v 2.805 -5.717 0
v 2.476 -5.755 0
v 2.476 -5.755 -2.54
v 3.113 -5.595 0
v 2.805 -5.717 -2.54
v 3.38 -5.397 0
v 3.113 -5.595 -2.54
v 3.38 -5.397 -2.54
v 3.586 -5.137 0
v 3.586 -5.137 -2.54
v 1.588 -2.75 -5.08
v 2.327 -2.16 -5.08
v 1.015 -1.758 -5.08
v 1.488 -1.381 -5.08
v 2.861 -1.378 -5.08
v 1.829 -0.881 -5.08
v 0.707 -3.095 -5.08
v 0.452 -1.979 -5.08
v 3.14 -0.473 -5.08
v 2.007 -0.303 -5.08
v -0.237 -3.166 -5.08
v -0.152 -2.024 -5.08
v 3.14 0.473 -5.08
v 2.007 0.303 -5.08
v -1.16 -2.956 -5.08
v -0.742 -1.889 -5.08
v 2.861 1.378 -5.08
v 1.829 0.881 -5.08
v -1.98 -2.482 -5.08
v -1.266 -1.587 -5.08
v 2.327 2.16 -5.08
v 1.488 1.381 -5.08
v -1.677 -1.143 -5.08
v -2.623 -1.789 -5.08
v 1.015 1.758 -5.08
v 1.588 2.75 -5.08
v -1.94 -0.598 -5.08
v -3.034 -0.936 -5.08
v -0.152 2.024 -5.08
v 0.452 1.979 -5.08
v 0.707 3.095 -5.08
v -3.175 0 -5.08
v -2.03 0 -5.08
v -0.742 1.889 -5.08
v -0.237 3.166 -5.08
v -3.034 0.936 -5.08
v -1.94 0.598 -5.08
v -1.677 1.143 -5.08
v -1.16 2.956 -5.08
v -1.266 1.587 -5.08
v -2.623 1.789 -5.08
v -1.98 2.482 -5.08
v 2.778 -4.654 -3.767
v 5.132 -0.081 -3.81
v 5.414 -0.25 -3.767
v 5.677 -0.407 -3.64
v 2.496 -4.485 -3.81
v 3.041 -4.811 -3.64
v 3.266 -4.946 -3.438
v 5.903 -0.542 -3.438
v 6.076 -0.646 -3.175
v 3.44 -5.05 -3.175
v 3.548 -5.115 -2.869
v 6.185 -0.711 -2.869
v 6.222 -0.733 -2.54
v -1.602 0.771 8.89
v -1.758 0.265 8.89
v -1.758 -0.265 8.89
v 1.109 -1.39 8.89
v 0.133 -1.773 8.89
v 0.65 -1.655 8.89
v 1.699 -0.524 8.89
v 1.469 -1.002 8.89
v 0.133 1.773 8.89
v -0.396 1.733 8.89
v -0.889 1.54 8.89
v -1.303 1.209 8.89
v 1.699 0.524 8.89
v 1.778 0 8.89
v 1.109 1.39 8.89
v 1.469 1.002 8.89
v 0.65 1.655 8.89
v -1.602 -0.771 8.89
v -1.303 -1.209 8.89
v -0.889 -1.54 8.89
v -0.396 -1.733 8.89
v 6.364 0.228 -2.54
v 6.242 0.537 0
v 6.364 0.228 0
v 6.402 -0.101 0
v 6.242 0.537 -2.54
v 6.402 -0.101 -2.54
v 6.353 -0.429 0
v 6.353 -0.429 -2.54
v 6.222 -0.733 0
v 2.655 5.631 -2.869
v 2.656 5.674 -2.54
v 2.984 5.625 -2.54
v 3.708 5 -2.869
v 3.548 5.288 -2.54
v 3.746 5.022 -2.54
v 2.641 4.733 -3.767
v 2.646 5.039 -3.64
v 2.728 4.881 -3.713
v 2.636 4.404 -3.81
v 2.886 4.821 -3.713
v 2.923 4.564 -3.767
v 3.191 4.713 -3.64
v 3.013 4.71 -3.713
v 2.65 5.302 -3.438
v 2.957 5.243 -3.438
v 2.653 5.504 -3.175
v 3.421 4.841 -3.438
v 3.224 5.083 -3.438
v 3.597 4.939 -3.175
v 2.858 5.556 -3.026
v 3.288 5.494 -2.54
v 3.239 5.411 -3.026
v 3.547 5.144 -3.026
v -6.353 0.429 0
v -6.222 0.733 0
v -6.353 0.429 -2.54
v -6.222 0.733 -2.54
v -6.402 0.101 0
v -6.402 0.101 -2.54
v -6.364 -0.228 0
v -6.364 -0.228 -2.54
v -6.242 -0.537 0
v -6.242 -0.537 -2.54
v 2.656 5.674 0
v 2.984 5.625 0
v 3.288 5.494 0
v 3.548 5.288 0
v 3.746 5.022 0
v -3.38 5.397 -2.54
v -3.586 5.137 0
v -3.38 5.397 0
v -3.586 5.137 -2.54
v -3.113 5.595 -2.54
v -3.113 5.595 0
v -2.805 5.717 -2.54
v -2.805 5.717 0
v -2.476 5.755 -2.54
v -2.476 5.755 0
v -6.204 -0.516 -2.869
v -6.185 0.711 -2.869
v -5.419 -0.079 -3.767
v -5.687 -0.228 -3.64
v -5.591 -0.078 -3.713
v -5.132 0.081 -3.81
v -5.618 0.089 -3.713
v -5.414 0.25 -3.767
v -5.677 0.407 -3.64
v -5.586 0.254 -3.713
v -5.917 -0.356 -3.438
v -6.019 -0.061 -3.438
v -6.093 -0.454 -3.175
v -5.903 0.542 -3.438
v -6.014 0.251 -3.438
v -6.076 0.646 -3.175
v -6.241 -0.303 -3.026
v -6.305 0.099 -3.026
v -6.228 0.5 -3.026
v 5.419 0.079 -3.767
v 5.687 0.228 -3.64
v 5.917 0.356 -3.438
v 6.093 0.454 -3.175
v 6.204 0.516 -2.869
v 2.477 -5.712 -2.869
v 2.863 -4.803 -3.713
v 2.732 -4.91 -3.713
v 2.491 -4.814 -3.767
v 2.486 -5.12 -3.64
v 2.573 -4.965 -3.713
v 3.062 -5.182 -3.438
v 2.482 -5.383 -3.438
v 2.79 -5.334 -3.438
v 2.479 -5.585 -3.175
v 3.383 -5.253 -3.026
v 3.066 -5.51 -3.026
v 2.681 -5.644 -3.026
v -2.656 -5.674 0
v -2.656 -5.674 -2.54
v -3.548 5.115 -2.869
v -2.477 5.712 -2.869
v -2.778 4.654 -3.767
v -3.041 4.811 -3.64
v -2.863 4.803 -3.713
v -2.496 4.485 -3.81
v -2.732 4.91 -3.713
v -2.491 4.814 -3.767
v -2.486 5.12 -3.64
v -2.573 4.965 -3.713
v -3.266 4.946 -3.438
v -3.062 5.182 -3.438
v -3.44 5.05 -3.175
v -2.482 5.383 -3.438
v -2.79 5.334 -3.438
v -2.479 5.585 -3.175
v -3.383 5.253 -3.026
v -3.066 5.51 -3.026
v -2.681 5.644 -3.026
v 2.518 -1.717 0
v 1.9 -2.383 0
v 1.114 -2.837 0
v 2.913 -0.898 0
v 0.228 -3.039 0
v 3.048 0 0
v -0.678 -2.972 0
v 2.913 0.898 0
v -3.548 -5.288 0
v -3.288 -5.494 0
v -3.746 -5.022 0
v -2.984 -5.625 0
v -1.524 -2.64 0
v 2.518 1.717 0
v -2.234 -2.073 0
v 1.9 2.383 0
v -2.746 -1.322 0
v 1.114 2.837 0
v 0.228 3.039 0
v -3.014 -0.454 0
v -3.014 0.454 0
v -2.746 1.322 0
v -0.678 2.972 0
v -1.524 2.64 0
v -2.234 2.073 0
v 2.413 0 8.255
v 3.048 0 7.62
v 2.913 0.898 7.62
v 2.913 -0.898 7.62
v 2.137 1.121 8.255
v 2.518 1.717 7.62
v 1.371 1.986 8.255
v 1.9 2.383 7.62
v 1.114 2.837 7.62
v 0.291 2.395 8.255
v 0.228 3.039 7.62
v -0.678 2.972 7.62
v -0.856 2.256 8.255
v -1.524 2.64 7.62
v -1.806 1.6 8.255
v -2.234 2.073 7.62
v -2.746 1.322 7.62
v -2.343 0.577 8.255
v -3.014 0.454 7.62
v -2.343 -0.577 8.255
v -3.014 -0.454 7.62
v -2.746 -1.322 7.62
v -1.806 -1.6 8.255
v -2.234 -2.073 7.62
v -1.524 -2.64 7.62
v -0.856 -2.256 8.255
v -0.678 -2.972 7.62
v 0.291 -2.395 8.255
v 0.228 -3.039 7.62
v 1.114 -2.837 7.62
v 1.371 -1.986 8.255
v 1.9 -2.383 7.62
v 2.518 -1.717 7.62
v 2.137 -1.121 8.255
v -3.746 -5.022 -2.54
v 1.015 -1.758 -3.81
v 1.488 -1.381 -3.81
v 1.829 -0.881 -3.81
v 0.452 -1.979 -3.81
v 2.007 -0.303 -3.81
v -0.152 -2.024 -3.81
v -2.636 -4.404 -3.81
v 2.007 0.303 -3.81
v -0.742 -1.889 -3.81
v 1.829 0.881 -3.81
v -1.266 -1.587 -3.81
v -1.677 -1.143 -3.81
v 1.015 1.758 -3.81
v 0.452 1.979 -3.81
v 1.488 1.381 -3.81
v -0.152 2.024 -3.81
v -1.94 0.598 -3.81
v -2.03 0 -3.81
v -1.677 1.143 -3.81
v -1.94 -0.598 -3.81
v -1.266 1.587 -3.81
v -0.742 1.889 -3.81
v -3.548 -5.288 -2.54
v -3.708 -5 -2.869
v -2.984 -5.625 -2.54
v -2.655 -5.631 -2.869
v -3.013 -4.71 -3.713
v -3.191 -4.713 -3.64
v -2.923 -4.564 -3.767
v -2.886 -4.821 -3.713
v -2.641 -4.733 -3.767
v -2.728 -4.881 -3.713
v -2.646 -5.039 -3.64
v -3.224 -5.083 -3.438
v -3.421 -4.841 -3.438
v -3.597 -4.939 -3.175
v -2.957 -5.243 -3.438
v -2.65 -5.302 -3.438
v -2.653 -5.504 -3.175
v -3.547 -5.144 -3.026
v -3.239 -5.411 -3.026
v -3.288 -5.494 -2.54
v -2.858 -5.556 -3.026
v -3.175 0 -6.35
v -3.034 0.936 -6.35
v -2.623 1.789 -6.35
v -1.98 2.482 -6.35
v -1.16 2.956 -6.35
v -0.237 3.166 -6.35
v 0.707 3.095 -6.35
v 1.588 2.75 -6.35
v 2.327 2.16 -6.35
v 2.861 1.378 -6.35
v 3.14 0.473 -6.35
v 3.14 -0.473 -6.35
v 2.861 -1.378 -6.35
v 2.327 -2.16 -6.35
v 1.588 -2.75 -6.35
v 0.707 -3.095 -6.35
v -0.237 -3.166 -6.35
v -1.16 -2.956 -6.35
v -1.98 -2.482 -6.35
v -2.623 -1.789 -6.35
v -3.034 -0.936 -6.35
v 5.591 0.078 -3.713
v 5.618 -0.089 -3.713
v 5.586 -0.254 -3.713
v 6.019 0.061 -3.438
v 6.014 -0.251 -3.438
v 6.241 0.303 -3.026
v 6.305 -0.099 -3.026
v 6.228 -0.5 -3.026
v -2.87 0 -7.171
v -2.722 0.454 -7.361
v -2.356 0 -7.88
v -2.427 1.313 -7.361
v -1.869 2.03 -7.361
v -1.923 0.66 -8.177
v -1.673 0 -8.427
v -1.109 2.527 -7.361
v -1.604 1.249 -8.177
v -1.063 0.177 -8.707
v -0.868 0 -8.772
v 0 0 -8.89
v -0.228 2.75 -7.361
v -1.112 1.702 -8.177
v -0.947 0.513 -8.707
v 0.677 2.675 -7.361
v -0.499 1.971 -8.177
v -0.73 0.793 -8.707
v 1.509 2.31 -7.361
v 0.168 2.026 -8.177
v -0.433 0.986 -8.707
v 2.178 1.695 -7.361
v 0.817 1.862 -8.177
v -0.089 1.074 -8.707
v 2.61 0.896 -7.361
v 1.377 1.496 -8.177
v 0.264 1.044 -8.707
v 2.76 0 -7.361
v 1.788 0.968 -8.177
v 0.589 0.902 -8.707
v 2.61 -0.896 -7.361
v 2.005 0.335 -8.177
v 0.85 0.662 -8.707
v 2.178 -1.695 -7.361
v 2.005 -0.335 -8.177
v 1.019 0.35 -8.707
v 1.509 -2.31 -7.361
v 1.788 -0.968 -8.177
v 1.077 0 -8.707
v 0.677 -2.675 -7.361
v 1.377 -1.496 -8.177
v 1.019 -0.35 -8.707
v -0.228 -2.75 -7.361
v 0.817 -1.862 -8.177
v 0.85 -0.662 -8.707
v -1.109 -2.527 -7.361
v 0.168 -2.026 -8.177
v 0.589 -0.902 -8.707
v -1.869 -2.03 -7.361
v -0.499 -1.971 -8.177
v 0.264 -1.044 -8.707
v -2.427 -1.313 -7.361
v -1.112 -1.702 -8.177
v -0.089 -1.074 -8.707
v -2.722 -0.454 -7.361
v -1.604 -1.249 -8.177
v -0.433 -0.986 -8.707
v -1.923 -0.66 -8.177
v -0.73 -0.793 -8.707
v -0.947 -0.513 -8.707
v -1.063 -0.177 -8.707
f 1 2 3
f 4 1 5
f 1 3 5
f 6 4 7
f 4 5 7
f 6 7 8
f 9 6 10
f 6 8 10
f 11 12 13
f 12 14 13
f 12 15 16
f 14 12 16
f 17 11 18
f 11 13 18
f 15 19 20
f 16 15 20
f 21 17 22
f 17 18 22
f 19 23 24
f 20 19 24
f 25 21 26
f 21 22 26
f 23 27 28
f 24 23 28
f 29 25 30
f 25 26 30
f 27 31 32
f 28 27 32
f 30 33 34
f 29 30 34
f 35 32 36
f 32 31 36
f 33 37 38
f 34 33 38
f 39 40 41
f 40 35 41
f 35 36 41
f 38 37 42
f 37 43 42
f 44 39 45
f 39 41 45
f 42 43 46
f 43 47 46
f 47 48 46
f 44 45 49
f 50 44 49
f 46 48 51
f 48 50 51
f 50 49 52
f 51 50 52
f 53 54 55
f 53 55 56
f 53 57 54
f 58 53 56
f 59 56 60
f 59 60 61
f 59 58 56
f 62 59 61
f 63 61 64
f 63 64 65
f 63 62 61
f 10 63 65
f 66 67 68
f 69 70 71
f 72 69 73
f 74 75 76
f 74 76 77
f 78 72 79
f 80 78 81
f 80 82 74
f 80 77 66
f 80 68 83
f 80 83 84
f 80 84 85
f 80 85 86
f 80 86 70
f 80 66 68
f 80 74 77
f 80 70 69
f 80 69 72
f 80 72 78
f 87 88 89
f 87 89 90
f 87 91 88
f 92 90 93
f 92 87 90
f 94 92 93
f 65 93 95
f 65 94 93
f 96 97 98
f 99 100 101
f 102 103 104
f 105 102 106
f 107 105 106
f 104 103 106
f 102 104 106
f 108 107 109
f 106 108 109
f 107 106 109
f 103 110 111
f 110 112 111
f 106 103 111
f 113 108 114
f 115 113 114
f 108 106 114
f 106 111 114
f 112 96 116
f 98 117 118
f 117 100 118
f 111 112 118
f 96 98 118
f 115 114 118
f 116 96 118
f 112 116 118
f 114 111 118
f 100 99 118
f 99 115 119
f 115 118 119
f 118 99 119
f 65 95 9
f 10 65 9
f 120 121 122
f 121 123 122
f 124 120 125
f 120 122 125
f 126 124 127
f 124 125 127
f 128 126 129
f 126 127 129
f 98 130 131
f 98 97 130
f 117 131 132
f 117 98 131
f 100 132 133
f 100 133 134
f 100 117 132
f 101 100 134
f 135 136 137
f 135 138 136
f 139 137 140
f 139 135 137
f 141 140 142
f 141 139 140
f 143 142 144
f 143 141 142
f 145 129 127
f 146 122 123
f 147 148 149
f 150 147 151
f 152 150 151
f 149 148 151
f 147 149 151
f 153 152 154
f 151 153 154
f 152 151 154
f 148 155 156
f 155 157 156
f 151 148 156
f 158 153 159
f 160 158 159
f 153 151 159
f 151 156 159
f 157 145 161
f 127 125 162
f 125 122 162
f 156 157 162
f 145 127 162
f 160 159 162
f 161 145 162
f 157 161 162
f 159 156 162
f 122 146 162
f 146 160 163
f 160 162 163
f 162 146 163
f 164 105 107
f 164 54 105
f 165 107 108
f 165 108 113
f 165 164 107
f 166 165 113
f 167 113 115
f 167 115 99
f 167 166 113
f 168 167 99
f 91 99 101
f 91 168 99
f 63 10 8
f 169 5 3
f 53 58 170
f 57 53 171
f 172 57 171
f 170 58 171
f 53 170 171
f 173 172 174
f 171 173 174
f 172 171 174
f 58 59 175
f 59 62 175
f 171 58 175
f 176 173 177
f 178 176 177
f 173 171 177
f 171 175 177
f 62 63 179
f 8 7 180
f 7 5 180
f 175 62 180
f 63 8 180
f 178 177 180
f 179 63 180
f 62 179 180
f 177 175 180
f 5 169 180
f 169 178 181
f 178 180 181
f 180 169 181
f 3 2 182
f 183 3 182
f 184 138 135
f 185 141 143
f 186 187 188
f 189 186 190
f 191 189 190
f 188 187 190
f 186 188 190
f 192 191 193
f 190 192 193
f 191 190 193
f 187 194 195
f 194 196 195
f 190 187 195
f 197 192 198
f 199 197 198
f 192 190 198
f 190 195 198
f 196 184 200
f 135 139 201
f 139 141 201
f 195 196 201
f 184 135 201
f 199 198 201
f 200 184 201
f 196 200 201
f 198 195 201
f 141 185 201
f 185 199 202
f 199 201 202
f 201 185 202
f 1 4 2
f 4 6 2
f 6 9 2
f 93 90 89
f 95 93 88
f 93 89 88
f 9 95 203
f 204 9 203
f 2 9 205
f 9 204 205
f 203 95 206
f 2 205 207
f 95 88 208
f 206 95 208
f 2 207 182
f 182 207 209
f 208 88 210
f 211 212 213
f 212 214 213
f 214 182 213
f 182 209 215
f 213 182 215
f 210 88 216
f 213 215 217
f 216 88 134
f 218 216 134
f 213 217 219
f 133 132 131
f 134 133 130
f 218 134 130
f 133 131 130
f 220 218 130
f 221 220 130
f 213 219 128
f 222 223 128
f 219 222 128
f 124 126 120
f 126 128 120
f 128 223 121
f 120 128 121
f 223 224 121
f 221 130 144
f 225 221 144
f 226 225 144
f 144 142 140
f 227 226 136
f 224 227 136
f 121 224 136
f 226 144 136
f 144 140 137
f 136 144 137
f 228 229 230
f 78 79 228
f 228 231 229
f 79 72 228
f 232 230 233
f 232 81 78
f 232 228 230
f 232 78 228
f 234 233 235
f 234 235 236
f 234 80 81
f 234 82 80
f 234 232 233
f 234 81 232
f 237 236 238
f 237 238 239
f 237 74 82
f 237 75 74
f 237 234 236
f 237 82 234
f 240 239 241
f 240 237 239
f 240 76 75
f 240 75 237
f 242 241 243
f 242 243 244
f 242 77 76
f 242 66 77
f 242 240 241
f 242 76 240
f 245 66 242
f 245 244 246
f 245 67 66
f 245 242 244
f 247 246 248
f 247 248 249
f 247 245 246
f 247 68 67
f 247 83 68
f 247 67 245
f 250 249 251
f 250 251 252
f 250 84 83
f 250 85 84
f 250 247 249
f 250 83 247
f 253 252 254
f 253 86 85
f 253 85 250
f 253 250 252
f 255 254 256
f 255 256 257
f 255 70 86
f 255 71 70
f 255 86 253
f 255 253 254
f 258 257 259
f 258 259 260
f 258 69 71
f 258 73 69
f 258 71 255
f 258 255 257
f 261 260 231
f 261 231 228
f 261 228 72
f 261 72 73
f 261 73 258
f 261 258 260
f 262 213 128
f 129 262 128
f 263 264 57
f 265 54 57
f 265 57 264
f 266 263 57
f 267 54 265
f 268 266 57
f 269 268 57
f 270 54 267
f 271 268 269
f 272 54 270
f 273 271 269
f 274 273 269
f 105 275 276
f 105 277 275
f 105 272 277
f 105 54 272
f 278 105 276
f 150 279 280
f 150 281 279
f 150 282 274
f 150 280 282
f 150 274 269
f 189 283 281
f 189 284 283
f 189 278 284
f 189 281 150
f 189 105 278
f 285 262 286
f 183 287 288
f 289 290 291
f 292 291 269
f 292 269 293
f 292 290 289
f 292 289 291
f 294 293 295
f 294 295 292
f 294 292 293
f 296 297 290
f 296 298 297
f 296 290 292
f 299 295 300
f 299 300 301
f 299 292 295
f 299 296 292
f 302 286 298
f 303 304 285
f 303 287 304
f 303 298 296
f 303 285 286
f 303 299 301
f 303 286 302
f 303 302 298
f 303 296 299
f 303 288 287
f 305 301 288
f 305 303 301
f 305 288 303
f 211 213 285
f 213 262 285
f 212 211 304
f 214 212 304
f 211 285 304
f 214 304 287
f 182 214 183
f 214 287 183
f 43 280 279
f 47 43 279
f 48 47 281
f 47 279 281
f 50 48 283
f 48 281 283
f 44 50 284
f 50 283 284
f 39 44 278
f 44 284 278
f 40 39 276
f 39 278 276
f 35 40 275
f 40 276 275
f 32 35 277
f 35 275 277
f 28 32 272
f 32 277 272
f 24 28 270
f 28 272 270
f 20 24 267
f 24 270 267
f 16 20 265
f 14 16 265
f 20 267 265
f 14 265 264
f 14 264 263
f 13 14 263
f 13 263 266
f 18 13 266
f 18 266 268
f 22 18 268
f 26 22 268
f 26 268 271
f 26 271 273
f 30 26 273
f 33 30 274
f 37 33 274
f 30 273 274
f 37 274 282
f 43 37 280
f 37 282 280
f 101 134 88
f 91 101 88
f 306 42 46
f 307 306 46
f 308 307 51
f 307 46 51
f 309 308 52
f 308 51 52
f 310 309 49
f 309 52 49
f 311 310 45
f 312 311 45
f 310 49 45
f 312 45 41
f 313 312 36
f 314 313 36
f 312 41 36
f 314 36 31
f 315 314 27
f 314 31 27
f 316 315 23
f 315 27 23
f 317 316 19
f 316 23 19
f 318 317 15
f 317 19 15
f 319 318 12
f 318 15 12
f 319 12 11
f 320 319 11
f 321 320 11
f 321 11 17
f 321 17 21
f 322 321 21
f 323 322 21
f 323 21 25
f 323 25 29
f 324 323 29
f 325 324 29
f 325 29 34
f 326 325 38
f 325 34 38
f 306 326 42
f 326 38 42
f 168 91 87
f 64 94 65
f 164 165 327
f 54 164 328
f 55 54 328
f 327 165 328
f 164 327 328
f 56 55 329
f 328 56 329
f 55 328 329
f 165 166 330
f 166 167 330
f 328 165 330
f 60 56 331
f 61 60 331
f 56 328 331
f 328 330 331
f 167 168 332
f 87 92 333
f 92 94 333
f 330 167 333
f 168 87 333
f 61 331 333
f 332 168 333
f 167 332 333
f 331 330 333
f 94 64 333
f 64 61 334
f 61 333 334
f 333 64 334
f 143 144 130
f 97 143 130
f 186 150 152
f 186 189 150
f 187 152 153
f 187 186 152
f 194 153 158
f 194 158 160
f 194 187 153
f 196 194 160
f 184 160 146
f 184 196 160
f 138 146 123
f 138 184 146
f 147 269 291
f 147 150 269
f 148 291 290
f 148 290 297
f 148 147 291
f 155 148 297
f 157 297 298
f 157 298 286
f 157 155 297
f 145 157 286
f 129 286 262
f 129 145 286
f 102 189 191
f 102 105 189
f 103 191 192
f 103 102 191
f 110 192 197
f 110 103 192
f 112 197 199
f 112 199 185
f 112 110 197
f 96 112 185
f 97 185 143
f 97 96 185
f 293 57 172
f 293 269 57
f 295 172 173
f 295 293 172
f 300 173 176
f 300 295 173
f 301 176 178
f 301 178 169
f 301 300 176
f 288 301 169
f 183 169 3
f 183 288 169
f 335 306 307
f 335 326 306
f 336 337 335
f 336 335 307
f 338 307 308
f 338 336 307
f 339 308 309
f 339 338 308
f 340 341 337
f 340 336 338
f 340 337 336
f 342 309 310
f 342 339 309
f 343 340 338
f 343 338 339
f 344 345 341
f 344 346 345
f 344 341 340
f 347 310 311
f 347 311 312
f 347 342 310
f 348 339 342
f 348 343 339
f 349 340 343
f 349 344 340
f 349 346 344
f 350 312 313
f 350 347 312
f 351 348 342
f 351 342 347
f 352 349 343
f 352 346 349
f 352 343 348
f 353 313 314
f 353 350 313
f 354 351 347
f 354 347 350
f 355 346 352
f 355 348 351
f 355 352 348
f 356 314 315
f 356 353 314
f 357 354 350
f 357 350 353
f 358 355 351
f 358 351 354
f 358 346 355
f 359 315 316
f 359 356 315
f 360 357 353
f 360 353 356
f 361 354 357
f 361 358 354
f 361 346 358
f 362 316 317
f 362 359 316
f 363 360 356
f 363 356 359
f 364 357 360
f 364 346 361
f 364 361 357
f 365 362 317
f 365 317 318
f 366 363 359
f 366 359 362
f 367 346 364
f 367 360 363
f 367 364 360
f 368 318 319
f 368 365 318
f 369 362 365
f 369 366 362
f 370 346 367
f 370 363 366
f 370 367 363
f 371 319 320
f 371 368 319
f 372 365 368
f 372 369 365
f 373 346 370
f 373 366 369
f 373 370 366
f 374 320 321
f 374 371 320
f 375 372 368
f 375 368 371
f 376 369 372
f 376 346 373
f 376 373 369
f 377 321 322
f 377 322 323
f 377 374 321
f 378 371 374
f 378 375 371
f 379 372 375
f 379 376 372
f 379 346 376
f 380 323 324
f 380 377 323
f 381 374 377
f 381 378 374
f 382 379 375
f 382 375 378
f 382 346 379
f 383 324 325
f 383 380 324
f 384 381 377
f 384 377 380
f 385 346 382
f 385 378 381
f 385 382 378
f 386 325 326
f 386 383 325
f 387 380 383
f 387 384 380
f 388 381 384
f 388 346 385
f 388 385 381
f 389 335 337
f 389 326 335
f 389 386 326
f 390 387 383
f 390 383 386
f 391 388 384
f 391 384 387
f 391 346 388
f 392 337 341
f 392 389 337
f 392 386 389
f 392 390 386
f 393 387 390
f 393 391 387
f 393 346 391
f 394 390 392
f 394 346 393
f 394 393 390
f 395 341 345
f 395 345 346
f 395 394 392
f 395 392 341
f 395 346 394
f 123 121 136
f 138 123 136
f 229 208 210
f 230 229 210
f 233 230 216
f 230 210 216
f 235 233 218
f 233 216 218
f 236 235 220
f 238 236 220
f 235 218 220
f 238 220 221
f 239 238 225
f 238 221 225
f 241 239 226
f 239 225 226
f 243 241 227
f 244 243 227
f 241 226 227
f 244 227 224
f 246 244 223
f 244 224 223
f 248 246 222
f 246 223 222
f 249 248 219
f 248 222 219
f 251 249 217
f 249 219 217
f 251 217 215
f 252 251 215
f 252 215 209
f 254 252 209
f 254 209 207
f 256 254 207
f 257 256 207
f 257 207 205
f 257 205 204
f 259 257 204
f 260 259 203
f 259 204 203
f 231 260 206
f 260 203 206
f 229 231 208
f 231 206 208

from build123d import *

# Parameters (mm, degrees)
SKETCH1_R         = 3.048
EXTRUDE1_DEPTH    = 8.89
CHAMFER1_SIZE     = 1.27
EXTRUDE2_DEPTH    = 3.81
SKETCH3_R         = 2.029785207
EXTRUDE3_DEPTH    = 1.27
SKETCH4_R         = 3.175
EXTRUDE4_DEPTH    = 1.27
DOME1_FACE_RADIUS = 3.175
DOME1_HEIGHT      = 2.54
FILLET1_R         = 1.27


with BuildPart() as part:
    # Sketch1 → Extrude1 (new body)
    with BuildSketch(Plane.XY):
        Circle(SKETCH1_R)
    extrude(amount=EXTRUDE1_DEPTH)

    # Chamfer1
    chamfer1_edges = [part.edges().sort_by_distance(p)[0] for p in [
        (-3.048, 0, 8.89),
    ]]
    chamfer(chamfer1_edges, length=CHAMFER1_SIZE)

    # Sketch2 → Extrude2 (add)
    with BuildSketch(Plane(origin=(0, 0, 0), x_dir=(-1, 0, 0), z_dir=(0, 0, -1))):
        Polygon((6.598292207, 0.104115064), (3.208979813, 5.766346205), (-3.389312394, 5.662231141), (-6.598292207, -0.104115064), (-3.208979813, -5.766346205), (3.389312394, -5.662231141), align=None)
    extrude(amount=EXTRUDE2_DEPTH)

    # Sketch3 → Extrude3 (add)
    with BuildSketch(Plane(origin=(0, 0, -3.81), x_dir=(-1, 0, 0), z_dir=(0, 0, -1))):
        Circle(SKETCH3_R)
    extrude(amount=EXTRUDE3_DEPTH)

    # Sketch4 → Extrude4 (add)
    with BuildSketch(Plane(origin=(0, 0, -5.08), x_dir=(-1, 0, 0), z_dir=(0, 0, -1))):
        Circle(SKETCH4_R)
    extrude(amount=EXTRUDE4_DEPTH)

    # Dome1: a dome of height H over a round flat face of radius A is a cap of a sphere of radius (A * A + H * H) / (2 * H)
    dome1_r = (DOME1_FACE_RADIUS * DOME1_FACE_RADIUS + DOME1_HEIGHT * DOME1_HEIGHT) / (2 * DOME1_HEIGHT)
    dome1_base = Plane((0, 0, -6.35), z_dir=(0, 0, -1))
    with Locations(dome1_base.offset(DOME1_HEIGHT - dome1_r)):
        dome1_ball = Sphere(dome1_r, mode=Mode.PRIVATE)
    add(split(dome1_ball, bisect_by=dome1_base, keep=Keep.TOP, mode=Mode.PRIVATE))

    # Fillet1
    fillet1_edges = [part.edges().sort_by_distance(p)[0] for p in [
        (3.389312394, 5.662231141, -1.905),
        (6.598292207, -0.104115064, -1.905),
        (3.208979813, -5.766346205, -1.905),
        (-4.993802301, -2.779058038, -3.81),
        (-4.90363601, 2.935230635, -3.81),
        (0.090166291, 5.714288673, -3.81),
        (4.993802301, 2.779058038, -3.81),
        (4.90363601, -2.935230635, -3.81),
        (-0.090166291, -5.714288673, -3.81),
        (-3.389312394, -5.662231141, -1.905),
        (-6.598292207, 0.104115064, -1.905),
        (-3.208979813, 5.766346205, -1.905),
    ]]
    fillet(fillet1_edges, radius=FILLET1_R)


solid = part.part
